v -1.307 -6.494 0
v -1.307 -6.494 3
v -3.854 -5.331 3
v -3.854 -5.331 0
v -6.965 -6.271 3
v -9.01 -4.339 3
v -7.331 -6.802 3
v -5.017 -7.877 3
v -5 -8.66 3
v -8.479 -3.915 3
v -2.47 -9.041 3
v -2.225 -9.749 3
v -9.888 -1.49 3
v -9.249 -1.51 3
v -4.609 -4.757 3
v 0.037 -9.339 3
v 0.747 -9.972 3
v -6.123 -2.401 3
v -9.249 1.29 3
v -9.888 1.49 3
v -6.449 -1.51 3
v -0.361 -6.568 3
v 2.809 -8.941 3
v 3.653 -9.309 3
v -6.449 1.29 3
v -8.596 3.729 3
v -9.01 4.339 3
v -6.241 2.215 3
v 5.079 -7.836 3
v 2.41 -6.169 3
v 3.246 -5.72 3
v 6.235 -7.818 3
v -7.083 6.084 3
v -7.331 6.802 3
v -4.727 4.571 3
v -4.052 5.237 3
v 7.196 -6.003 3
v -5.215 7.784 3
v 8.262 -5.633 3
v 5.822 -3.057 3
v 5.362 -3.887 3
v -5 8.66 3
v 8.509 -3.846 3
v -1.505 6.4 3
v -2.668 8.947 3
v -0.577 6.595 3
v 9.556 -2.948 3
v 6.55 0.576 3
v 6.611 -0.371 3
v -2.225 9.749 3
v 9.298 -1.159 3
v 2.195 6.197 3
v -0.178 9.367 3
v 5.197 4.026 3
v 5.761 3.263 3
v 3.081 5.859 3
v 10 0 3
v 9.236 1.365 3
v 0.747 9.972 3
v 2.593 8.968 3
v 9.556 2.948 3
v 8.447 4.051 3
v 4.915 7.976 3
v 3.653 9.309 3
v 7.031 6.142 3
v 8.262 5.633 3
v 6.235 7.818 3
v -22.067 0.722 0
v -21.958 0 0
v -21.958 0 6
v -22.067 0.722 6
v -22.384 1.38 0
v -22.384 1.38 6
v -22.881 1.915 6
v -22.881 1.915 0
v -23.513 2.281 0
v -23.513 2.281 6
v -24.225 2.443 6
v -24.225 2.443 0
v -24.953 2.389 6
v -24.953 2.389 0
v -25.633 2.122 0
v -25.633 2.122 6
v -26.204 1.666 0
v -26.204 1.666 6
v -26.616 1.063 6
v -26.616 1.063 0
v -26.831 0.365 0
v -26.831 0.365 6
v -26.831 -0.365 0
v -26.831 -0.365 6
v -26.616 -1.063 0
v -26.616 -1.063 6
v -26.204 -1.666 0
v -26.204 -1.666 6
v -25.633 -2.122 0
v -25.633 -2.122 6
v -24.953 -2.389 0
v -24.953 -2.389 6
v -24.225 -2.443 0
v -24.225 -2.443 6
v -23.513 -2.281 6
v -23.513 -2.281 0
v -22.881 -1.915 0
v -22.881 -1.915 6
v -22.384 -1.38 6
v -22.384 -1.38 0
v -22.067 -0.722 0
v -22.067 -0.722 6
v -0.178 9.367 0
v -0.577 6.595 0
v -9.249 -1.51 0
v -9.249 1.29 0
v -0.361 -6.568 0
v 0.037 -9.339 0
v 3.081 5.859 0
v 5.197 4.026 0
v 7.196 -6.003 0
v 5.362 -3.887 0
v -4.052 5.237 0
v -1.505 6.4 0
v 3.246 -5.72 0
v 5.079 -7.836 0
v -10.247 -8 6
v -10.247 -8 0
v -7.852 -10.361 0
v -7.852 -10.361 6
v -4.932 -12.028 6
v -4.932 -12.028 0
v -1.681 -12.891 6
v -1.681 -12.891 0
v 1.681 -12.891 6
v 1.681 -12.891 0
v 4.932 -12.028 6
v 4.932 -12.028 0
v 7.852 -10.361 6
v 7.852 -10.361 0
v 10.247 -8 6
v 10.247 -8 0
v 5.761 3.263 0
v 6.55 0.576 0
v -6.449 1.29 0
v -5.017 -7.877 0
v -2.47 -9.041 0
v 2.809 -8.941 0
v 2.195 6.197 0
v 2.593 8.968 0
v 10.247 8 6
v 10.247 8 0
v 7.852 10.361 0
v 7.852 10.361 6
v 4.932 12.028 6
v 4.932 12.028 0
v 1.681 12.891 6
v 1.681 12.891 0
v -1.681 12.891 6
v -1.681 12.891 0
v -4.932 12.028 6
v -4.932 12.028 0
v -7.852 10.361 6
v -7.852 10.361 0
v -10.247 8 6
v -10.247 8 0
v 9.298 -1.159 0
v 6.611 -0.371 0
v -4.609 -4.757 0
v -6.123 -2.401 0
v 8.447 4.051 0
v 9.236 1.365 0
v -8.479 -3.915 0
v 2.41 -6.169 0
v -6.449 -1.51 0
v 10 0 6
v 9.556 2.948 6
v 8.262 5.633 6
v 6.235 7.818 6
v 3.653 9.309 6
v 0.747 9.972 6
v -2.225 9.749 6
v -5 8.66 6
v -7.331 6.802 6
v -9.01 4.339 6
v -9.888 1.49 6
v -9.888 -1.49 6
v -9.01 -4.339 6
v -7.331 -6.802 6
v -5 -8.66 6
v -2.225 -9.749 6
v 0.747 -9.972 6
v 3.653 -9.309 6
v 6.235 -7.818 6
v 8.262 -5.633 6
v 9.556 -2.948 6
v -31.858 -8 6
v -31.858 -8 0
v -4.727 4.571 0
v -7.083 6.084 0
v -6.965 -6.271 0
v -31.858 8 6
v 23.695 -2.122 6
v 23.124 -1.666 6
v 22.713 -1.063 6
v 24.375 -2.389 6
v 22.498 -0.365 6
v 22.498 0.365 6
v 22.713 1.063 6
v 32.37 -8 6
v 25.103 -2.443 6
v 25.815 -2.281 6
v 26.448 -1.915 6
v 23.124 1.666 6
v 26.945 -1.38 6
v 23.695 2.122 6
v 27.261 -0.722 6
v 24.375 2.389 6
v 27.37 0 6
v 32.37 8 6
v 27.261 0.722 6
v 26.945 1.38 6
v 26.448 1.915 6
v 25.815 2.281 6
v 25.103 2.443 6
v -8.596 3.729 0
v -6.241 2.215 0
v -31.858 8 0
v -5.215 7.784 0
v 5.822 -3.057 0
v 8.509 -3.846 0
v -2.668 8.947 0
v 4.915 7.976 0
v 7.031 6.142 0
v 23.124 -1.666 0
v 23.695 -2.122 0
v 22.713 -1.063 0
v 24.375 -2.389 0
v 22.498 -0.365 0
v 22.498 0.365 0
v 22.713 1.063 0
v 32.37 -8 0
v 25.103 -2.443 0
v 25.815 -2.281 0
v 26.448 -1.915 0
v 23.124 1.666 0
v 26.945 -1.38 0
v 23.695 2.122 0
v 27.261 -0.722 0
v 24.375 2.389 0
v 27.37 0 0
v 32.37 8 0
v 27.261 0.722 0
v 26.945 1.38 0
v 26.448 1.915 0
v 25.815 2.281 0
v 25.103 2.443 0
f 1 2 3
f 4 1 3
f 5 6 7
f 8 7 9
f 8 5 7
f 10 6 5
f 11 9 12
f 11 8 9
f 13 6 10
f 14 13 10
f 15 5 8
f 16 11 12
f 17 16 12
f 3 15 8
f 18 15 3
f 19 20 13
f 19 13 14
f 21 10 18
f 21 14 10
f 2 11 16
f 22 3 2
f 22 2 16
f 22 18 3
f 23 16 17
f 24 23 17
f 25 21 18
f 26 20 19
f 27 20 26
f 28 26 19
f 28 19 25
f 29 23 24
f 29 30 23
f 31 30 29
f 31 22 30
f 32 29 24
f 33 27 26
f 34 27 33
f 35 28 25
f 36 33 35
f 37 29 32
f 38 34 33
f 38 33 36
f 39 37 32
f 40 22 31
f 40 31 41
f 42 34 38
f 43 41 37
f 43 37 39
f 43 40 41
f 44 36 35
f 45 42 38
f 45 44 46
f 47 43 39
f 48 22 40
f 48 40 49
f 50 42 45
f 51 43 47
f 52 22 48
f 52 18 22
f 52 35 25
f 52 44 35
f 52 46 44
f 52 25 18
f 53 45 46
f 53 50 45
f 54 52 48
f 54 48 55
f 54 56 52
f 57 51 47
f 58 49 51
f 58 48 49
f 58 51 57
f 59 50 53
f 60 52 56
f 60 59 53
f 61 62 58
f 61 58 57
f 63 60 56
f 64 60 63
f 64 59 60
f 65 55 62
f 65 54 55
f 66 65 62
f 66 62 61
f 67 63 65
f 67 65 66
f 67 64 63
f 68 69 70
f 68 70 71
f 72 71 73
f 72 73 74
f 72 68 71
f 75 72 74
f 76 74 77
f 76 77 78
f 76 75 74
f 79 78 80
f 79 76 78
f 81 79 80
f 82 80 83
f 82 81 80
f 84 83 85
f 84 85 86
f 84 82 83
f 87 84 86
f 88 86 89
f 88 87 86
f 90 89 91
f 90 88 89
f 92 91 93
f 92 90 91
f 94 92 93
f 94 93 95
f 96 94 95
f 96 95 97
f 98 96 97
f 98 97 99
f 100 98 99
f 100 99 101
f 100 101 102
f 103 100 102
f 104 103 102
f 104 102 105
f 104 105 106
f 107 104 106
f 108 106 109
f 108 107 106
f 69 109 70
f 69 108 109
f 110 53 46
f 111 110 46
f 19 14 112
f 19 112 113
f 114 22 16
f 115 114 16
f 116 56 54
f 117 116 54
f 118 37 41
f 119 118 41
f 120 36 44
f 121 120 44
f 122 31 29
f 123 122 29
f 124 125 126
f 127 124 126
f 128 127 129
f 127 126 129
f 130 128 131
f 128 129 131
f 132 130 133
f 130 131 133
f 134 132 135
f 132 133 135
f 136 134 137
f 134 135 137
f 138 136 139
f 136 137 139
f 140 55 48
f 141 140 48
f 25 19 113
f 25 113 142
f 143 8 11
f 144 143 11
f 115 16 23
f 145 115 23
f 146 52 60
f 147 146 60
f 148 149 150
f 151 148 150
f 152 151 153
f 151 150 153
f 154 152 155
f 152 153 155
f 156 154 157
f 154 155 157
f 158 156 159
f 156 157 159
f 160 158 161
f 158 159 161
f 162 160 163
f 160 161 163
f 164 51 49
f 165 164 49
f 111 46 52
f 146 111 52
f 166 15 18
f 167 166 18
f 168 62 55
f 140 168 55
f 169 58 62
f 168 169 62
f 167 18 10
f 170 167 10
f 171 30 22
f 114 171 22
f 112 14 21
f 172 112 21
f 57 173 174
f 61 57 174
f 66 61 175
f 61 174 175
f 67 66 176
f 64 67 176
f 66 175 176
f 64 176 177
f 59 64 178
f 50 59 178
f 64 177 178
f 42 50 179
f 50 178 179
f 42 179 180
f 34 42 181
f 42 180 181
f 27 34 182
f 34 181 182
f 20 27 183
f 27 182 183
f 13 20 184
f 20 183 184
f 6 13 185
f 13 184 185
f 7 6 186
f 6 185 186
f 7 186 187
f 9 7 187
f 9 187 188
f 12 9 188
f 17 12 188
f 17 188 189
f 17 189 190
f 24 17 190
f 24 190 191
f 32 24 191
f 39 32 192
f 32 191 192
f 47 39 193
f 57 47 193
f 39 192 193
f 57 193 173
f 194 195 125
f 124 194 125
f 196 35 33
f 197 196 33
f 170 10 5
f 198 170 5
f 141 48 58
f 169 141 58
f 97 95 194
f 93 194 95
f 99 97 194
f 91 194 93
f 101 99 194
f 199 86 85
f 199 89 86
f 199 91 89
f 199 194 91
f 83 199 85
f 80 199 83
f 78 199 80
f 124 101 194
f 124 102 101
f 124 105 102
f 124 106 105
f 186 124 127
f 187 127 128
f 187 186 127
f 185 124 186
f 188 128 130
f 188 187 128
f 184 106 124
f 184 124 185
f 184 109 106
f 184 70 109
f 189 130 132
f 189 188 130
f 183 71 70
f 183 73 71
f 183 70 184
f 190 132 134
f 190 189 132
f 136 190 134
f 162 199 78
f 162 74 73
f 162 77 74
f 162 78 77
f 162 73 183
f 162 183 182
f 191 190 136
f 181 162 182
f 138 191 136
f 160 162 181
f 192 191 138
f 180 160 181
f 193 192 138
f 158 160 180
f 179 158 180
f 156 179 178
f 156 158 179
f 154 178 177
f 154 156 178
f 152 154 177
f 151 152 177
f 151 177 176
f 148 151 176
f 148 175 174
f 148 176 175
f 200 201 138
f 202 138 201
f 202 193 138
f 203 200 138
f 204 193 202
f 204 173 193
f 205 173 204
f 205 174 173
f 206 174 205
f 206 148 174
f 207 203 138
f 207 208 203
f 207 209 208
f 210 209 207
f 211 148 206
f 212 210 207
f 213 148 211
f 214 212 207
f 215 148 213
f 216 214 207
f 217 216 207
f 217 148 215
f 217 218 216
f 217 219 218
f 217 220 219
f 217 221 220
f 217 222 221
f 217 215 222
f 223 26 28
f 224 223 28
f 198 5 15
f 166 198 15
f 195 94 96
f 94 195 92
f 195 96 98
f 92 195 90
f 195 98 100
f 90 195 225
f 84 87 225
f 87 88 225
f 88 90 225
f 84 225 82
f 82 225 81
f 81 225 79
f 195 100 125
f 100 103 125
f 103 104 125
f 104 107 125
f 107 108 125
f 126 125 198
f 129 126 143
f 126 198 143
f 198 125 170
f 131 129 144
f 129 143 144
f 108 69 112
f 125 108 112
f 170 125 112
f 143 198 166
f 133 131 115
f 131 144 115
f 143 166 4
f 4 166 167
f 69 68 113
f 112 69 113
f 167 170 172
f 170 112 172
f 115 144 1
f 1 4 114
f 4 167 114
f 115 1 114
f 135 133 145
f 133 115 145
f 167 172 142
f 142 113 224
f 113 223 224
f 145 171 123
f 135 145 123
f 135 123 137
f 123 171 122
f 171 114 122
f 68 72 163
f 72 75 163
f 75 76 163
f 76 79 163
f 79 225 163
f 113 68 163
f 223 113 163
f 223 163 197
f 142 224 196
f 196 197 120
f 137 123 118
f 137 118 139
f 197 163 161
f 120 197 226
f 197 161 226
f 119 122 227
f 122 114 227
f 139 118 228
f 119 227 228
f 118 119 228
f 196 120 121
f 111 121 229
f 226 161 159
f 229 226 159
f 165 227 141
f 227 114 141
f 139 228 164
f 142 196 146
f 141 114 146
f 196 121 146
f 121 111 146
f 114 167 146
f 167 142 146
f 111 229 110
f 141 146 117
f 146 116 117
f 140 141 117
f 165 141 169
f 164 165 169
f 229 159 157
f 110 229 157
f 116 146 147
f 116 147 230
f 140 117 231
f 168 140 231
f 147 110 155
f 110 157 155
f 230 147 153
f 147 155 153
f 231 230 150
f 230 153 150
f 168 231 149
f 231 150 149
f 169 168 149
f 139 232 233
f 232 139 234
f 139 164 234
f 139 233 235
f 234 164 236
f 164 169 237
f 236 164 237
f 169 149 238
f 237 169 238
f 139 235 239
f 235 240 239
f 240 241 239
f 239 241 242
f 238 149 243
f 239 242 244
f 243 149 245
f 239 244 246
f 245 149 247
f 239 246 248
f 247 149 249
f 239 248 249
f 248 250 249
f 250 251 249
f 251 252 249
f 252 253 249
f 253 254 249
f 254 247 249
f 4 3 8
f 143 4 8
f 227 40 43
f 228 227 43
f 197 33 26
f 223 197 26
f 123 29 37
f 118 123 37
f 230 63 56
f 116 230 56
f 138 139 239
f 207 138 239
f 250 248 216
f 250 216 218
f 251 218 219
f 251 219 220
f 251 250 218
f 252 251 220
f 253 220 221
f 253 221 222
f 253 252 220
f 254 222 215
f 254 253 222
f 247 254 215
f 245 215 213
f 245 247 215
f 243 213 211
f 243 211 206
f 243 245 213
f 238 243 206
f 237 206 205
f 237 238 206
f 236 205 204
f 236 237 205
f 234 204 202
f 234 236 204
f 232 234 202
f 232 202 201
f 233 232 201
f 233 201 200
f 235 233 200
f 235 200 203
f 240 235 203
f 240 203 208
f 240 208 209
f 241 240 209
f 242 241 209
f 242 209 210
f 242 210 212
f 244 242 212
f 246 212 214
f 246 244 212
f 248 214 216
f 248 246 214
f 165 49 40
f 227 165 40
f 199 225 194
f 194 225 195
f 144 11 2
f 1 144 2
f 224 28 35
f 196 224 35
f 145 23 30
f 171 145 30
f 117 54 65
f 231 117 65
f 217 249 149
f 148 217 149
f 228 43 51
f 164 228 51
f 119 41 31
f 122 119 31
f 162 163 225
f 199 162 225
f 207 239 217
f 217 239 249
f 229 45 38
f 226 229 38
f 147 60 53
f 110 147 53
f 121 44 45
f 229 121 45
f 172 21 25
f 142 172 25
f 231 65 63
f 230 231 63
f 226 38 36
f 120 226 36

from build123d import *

# Parameters (mm, degrees)
F0_R     = 2.45
F1_DEPTH = 6
F2_R     = 10
F3_DEPTH = 3
F4_W     = 2.8
F4_H     = 2.8
F5_DEPTH = 3.001


with BuildPart() as f1:
    # F0 (on Top) → F1 (new body)
    with BuildSketch(Plane.XY):
        with BuildLine():
            ThreePointArc((10.246951, -8), (12.292485, -4.230227), (13, 0))
            ThreePointArc((13, 0), (12.292485, 4.230227), (10.246951, 8))
            ThreePointArc((10.246951, 8), (0, 13), (-10.246951, 8))
            ThreePointArc((-10.246951, 8), (-13, 0), (-10.246951, -8))
            ThreePointArc((-10.246951, -8), (0, -13), (10.246951, -8))
        make_face()
        with BuildLine():
            ThreePointArc((10.246951, 8), (12.292485, 4.230227), (13, 0))
            ThreePointArc((13, 0), (12.292485, -4.230227), (10.246951, -8))
            Line((10.246951, -8), (32.370236, -8))
            Line((32.370236, -8), (32.370236, 8))
            Line((32.370236, 8), (10.246951, 8))
        make_face()
        with Locations((24.920236, 0)):
            Circle(F0_R, mode=Mode.SUBTRACT)
        with BuildLine():
            ThreePointArc((-10.246951, -8), (-13, 0), (-10.246951, 8))
            Line((-10.246951, 8), (-31.858318, 8))
            Line((-31.858318, 8), (-31.858318, -8))
            Line((-31.858318, -8), (-10.246951, -8))
        make_face()
        with Locations((-24.408318, 0)):
            Circle(F0_R, mode=Mode.SUBTRACT)
    extrude(amount=F1_DEPTH)

    # F2 (on face) → F3 (cut)
    with BuildSketch(Plane.XY.offset(6)):
        Circle(F2_R)
    extrude(amount=-F3_DEPTH, mode=Mode.SUBTRACT)

    # F4 (on face) → F5 (cut, through all)
    with BuildSketch(Plane.XY.offset(3)):
        with Locations((-7.84869, -0.110486)):
            Rectangle(F4_W, F4_H)
        Polygon((-4.609375, -4.756964), (-6.123169, -2.401454), (-8.478679, -3.915248), (-6.964885, -6.270758), align=None)
        Polygon((-1.306867, -6.493666), (-3.853836, -5.330504), (-5.016998, -7.877474), (-2.470029, -9.040636), align=None)
        Polygon((2.410312, -6.169202), (-0.361188, -6.567683), (0.037294, -9.339184), (2.808794, -8.940702), align=None)
        Polygon((5.361984, -3.886587), (3.245885, -5.720197), (5.079495, -7.836296), (7.195594, -6.002685), align=None)
        Polygon((6.611013, -0.370534), (5.822162, -3.057115), (8.508742, -3.845966), (9.297593, -1.159386), align=None)
        Polygon((5.760842, 3.262633), (6.549693, 0.576053), (9.236273, 1.364904), (8.447422, 4.051484), align=None)
        Polygon((3.081393, 5.859411), (5.197492, 4.025801), (7.031102, 6.141899), (4.915004, 7.975509), align=None)
        Polygon((-0.576626, 6.59534), (2.194874, 6.196858), (2.593356, 8.968358), (-0.178144, 9.36684), align=None)
        Polygon((-4.051821, 5.236769), (-1.504851, 6.399931), (-2.668013, 8.9469), (-5.214983, 7.783738), align=None)
        Polygon((-6.240842, 2.215033), (-4.727048, 4.570543), (-7.082557, 6.084338), (-8.596352, 3.728828), align=None)
    extrude(amount=-F5_DEPTH, mode=Mode.SUBTRACT)


solid = f1.part
